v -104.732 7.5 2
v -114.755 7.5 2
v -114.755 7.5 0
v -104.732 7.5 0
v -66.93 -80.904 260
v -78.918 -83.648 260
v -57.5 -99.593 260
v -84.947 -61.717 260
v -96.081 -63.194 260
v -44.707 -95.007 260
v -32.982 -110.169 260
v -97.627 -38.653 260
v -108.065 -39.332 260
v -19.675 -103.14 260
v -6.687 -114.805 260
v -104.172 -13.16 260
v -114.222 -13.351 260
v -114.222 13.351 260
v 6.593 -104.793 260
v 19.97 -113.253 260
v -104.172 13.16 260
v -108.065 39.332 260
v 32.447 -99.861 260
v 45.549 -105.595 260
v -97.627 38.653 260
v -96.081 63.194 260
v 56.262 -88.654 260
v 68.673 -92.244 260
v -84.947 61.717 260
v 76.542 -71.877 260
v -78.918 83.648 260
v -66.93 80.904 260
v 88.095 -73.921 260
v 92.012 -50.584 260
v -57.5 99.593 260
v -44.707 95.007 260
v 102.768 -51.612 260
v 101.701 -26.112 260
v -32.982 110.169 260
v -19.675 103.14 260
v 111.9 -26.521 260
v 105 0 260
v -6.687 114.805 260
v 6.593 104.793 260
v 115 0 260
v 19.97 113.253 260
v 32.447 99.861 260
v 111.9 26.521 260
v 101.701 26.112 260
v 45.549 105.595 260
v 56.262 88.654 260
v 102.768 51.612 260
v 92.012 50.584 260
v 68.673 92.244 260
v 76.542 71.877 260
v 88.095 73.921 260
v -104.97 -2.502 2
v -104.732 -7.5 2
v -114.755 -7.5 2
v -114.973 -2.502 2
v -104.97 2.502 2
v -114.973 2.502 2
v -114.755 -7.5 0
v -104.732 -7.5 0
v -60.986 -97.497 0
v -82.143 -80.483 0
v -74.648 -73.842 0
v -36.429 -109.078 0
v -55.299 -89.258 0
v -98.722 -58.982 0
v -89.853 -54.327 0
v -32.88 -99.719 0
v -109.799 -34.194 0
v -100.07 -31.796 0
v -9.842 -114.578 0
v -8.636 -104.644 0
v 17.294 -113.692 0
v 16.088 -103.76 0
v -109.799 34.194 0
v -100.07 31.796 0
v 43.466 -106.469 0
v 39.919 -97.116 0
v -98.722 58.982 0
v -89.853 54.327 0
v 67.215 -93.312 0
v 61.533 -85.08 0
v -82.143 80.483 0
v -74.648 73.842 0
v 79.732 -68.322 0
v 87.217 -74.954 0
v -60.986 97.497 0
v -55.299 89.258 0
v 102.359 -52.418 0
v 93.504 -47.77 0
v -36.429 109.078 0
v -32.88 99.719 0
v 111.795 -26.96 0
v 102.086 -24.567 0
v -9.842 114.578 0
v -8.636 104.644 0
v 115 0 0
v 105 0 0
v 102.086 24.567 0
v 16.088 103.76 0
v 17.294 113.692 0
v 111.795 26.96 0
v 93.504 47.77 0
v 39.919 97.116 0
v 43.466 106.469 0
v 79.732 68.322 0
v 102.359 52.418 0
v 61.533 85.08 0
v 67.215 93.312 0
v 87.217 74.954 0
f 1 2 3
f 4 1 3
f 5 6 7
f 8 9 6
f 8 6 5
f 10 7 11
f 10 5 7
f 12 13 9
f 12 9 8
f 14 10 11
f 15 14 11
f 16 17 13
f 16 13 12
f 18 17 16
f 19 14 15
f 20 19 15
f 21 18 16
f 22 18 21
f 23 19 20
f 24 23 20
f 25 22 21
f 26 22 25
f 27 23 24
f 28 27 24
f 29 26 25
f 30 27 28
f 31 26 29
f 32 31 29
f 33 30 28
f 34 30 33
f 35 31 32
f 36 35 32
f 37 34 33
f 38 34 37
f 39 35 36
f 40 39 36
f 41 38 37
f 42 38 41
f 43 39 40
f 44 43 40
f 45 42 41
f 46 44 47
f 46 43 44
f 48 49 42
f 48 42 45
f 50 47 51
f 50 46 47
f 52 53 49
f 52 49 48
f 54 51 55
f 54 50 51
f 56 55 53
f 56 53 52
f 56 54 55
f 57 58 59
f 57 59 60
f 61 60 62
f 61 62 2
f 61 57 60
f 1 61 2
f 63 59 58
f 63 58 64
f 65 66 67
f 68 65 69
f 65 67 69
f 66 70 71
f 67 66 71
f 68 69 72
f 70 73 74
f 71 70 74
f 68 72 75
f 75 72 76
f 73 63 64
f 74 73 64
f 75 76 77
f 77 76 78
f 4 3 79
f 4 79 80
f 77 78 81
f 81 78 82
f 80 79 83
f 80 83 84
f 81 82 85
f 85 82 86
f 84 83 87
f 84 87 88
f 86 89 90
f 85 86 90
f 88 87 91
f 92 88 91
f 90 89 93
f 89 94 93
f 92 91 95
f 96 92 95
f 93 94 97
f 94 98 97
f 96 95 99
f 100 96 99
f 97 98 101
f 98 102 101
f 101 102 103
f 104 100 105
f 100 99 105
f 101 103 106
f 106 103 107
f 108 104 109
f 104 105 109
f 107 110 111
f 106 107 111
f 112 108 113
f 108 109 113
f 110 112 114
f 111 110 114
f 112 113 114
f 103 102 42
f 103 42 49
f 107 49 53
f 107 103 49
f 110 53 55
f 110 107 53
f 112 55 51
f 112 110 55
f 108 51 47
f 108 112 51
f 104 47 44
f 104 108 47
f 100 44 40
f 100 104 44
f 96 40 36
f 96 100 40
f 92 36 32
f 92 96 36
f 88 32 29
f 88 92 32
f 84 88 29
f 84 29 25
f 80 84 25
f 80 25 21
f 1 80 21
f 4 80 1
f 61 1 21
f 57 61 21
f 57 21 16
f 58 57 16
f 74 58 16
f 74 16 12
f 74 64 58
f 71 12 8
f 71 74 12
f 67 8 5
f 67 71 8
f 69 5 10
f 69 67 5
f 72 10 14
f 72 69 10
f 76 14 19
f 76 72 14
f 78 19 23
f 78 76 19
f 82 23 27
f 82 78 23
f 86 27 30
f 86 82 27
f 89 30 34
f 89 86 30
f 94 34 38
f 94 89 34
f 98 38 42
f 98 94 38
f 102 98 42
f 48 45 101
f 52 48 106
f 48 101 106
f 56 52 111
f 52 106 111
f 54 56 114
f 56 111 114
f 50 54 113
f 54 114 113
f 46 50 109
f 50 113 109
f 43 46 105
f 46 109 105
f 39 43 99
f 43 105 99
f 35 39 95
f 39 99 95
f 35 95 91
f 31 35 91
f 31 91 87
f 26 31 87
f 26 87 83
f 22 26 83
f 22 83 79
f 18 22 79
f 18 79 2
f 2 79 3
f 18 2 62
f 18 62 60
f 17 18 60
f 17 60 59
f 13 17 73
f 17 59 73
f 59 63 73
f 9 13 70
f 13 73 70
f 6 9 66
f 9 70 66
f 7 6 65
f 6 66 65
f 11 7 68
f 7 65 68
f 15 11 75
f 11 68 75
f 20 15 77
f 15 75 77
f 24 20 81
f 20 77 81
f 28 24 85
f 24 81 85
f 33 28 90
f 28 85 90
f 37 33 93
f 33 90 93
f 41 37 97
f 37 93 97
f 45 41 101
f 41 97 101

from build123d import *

# Parameters (mm, degrees)
SKETCH2_R           = 115
SKETCH2_R_2         = 105
BOSS_EXTRUDE1_DEPTH = 260
CUT_EXTRUDE1_REACH  = 117
SKETCH3_W           = 2
SKETCH3_H           = 15


with BuildPart() as part:
    # Sketch2 → Boss-Extrude1 (new body)
    with BuildSketch(Plane.XY):
        Circle(SKETCH2_R)
        Circle(SKETCH2_R_2, mode=Mode.SUBTRACT)
    extrude(amount=BOSS_EXTRUDE1_DEPTH)

    # Sketch3 → Cut-Extrude1 (cut, up to next)
    with BuildSketch(Plane(origin=(0, 0, 0), x_dir=(0, 0, -1), z_dir=(1, 0, 0)), mode=Mode.PRIVATE) as cut_extrude1_sk1:
        with Locations((-1, 0)):
            Rectangle(SKETCH3_W, SKETCH3_H)
    cut_extrude1_tool1 = extrude(cut_extrude1_sk1.sketch, amount=-CUT_EXTRUDE1_REACH, mode=Mode.PRIVATE) & part.part
    add(cut_extrude1_tool1.solids().sort_by_distance((0, 0, 1))[0], mode=Mode.SUBTRACT)


solid = part.part
